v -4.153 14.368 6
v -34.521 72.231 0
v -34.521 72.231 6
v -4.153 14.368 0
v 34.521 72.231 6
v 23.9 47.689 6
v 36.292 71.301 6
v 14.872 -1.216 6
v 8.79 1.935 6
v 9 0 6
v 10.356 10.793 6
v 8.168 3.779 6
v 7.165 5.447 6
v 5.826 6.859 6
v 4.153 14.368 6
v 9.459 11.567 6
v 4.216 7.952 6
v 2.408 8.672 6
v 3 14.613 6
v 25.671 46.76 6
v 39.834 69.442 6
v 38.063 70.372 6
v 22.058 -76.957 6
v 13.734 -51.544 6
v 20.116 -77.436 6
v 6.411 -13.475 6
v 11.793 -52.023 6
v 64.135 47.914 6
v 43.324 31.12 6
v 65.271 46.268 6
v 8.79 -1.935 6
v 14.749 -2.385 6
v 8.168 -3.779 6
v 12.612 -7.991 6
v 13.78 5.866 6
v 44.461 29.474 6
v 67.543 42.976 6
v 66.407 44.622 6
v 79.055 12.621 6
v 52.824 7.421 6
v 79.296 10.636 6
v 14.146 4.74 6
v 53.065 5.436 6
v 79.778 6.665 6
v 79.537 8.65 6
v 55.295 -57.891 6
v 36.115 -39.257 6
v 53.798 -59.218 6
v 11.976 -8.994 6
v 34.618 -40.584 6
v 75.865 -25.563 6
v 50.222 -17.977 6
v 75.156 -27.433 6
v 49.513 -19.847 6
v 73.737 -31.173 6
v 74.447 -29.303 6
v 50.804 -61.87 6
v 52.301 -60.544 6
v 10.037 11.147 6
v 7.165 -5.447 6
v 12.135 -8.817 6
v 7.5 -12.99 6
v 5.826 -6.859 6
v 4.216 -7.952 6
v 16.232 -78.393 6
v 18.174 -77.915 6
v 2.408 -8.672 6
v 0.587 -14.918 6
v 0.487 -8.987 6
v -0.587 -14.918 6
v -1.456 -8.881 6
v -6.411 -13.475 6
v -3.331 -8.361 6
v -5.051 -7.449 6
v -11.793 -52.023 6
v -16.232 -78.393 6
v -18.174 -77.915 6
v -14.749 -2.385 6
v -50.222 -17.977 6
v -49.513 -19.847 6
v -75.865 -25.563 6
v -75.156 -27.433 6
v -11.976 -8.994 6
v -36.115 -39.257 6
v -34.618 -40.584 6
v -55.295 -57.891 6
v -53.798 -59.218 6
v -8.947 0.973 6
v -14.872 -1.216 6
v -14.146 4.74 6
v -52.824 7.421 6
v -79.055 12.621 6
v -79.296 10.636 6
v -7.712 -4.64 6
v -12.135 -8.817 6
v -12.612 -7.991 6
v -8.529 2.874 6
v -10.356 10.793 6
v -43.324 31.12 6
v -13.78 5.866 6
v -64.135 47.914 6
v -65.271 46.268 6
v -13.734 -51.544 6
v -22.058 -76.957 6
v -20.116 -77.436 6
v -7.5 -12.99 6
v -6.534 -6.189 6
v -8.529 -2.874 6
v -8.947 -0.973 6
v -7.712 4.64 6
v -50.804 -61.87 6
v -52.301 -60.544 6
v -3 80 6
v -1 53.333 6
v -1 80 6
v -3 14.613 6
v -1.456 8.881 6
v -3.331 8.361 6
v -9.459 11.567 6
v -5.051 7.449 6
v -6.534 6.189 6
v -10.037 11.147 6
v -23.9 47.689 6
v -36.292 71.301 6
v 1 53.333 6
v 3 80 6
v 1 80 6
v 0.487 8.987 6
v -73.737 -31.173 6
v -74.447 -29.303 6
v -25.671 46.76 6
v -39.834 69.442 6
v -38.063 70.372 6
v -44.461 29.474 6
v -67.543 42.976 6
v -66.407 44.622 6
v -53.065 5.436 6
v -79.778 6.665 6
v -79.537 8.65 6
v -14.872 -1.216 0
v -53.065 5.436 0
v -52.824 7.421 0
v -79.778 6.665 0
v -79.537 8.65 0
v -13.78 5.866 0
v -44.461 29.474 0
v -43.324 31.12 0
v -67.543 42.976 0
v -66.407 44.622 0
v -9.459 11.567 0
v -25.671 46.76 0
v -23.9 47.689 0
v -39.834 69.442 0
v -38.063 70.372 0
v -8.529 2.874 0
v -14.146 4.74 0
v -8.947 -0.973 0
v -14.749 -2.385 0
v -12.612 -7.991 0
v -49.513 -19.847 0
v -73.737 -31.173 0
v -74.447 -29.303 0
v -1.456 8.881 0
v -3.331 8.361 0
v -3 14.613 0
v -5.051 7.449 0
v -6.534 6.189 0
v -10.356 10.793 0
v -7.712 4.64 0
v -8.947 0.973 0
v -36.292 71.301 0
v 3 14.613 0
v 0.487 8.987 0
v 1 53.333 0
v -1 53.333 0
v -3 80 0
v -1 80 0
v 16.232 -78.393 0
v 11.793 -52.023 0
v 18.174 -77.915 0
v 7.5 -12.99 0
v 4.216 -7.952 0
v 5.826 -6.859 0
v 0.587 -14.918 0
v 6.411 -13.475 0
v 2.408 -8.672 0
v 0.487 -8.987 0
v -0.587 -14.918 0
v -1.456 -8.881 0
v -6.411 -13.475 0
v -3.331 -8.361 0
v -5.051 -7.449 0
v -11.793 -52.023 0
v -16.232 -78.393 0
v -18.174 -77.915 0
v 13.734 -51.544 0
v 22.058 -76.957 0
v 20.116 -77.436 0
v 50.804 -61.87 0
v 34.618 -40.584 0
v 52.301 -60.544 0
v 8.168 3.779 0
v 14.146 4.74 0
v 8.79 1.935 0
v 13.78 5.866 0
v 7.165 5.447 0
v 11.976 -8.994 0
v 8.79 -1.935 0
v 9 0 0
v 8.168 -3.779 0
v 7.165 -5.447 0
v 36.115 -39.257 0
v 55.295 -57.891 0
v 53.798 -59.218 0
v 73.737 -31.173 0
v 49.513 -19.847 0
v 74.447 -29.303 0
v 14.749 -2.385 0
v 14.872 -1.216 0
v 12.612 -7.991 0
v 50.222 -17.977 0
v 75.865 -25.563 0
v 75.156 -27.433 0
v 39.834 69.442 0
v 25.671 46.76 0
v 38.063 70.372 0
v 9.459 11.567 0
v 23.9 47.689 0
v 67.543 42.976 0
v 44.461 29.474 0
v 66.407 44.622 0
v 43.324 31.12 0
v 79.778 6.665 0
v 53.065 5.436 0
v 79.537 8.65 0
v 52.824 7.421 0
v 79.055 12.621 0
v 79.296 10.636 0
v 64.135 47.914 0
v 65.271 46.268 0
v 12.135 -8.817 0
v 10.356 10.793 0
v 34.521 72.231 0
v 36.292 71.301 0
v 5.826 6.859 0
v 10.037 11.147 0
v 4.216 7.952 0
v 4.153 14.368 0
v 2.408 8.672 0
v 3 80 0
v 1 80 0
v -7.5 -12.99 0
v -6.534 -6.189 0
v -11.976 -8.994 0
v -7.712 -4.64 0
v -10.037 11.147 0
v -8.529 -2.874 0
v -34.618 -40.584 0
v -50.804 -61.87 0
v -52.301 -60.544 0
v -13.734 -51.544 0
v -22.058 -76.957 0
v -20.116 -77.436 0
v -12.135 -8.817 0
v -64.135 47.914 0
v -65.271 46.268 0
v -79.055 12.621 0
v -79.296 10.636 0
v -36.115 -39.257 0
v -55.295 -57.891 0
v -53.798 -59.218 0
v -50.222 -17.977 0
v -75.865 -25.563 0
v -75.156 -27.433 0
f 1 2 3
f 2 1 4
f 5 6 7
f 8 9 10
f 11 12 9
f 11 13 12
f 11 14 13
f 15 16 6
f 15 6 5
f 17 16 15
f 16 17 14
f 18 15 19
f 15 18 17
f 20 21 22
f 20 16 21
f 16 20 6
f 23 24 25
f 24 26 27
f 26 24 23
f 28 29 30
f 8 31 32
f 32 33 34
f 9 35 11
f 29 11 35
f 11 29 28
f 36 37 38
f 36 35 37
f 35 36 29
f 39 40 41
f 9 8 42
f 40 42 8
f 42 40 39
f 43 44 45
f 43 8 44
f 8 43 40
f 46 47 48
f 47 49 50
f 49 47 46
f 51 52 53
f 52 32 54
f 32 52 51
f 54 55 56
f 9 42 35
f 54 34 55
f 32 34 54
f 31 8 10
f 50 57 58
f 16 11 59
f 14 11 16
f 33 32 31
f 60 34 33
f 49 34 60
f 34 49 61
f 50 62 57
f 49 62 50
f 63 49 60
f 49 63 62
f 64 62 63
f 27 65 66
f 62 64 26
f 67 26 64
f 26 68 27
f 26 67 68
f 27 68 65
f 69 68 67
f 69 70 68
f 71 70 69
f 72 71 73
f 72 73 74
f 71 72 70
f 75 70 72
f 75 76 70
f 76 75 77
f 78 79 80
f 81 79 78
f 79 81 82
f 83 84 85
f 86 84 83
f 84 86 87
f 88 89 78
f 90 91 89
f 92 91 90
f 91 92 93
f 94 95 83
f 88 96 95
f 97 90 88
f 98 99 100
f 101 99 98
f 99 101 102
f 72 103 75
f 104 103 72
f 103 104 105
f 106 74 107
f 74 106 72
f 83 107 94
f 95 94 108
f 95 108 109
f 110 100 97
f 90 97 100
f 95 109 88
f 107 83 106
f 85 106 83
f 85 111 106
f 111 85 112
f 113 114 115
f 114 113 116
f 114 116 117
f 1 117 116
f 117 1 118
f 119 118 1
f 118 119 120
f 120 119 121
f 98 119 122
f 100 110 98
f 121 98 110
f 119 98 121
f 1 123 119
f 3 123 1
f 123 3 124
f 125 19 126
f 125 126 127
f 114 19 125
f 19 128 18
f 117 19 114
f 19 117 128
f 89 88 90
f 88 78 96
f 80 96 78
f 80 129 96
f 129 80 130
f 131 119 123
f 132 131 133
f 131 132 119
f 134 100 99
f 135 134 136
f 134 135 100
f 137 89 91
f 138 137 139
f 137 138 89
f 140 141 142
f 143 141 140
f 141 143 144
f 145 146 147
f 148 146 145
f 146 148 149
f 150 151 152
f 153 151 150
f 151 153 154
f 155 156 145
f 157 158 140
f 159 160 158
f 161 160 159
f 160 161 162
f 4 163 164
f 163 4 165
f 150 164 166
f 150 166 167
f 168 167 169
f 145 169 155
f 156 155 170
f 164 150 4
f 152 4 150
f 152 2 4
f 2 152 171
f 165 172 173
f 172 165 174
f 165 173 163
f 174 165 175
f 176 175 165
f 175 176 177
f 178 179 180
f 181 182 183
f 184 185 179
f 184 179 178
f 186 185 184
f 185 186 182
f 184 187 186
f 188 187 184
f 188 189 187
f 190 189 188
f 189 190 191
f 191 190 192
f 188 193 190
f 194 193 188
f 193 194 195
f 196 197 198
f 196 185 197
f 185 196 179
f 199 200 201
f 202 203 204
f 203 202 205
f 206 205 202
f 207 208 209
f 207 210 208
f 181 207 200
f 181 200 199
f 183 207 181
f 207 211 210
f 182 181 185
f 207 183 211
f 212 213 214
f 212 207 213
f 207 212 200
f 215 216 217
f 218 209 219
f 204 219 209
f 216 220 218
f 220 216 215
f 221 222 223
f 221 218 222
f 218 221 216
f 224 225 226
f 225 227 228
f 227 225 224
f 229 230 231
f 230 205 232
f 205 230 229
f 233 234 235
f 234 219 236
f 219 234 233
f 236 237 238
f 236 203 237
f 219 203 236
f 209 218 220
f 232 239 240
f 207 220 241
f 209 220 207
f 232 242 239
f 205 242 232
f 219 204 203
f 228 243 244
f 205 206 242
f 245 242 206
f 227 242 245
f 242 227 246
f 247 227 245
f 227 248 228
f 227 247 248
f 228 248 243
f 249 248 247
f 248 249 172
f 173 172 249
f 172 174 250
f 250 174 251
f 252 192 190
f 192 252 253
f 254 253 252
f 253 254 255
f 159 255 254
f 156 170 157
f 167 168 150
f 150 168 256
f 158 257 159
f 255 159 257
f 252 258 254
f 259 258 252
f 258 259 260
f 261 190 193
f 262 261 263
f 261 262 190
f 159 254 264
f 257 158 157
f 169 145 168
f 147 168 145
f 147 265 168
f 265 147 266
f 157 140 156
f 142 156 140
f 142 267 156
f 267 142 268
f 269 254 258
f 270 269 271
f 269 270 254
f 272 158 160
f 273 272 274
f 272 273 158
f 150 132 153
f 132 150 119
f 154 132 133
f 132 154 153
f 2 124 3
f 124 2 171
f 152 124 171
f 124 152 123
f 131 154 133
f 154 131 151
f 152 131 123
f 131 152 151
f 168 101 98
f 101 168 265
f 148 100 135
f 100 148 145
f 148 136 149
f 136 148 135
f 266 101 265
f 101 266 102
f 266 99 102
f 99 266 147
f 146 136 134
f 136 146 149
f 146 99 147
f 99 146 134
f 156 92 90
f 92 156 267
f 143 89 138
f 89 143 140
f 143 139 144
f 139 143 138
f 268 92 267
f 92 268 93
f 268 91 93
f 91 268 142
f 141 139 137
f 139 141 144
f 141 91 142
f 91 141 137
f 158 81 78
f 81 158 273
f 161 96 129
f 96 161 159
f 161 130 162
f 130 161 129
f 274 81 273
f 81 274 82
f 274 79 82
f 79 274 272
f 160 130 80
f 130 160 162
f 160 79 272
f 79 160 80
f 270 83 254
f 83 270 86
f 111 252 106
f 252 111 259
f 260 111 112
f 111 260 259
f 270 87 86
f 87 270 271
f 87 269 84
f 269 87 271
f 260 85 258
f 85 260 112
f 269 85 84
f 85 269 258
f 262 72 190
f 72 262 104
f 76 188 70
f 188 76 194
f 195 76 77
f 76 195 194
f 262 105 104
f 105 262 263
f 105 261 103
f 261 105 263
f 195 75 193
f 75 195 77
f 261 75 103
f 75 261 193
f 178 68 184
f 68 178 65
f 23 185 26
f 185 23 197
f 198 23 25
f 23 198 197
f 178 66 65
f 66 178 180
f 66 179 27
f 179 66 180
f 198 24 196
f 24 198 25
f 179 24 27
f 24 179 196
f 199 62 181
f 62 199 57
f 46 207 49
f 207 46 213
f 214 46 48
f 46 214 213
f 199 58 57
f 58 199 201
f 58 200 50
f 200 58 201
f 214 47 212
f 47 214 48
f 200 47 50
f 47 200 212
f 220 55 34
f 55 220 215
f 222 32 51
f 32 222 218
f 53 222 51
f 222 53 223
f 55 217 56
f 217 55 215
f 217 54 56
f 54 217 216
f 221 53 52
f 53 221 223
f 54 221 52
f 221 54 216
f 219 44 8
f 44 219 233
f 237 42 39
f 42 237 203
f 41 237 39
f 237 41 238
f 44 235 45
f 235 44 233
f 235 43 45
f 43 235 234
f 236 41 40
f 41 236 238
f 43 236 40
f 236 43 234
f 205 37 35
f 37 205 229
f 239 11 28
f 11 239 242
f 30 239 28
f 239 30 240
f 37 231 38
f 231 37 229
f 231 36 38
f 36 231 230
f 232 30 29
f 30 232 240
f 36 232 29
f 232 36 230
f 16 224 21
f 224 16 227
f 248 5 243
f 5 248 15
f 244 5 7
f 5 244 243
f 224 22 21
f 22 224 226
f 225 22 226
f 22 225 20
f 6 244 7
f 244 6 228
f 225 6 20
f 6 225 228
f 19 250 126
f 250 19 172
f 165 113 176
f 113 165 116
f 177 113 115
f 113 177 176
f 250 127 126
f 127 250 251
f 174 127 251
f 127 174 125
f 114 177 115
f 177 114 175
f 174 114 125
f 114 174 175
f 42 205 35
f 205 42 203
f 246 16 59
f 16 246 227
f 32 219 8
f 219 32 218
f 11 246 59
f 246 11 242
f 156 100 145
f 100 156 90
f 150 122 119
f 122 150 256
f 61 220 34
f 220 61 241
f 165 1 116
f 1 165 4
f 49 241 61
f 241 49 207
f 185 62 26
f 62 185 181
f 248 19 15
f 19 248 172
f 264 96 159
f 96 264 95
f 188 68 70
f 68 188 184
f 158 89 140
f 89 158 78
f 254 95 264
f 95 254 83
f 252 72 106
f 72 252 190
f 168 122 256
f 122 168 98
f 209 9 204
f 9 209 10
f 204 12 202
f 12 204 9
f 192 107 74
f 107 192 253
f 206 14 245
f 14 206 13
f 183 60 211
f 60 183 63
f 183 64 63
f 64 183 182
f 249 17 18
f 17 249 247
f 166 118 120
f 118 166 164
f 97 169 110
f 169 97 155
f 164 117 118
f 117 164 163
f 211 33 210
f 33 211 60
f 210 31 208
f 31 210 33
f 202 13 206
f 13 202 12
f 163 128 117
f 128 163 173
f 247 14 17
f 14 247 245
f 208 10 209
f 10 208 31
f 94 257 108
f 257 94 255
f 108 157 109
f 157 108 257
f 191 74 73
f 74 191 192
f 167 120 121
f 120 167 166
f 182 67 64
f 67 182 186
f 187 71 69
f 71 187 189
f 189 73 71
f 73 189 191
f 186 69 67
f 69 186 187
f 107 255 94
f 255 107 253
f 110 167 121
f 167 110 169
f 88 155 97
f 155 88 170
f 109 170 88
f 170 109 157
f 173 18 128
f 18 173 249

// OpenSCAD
//Leg count
legCount=13 ;//[2:15]
//Pie Cutter radius

pieCutterRadius = 80; //[15:80]

//Pie Cutter thickness
pieCutterthickness=6; //[2:10]

//Center  radius
centerRadius = 15; //[5:20]

main();

module main()
{
	difference()
	{
		union ()
		{
				for ( i = [1 :legCount])
				{
					rotate([0,0,i * (360/ legCount) ])
						leg(	x=pieCutterthickness,
								y=pieCutterRadius,
								z=pieCutterthickness);	
				}
				cylinder(r=centerRadius,h=pieCutterthickness);
		}
		translate([0,0,-pieCutterthickness/2]) 
				cylinder(	r=centerRadius-pieCutterthickness,
								h=2*pieCutterthickness);
	}
}

module leg(x,y,z)
{
	translate([-x/2,0,0] )
	difference()
	{ 
		cube([x,y,z]);
		translate([ x/3,2 *y/3 ,-1]) cube([x/3, y/3 +1 ,z+2]);
	}	
}
